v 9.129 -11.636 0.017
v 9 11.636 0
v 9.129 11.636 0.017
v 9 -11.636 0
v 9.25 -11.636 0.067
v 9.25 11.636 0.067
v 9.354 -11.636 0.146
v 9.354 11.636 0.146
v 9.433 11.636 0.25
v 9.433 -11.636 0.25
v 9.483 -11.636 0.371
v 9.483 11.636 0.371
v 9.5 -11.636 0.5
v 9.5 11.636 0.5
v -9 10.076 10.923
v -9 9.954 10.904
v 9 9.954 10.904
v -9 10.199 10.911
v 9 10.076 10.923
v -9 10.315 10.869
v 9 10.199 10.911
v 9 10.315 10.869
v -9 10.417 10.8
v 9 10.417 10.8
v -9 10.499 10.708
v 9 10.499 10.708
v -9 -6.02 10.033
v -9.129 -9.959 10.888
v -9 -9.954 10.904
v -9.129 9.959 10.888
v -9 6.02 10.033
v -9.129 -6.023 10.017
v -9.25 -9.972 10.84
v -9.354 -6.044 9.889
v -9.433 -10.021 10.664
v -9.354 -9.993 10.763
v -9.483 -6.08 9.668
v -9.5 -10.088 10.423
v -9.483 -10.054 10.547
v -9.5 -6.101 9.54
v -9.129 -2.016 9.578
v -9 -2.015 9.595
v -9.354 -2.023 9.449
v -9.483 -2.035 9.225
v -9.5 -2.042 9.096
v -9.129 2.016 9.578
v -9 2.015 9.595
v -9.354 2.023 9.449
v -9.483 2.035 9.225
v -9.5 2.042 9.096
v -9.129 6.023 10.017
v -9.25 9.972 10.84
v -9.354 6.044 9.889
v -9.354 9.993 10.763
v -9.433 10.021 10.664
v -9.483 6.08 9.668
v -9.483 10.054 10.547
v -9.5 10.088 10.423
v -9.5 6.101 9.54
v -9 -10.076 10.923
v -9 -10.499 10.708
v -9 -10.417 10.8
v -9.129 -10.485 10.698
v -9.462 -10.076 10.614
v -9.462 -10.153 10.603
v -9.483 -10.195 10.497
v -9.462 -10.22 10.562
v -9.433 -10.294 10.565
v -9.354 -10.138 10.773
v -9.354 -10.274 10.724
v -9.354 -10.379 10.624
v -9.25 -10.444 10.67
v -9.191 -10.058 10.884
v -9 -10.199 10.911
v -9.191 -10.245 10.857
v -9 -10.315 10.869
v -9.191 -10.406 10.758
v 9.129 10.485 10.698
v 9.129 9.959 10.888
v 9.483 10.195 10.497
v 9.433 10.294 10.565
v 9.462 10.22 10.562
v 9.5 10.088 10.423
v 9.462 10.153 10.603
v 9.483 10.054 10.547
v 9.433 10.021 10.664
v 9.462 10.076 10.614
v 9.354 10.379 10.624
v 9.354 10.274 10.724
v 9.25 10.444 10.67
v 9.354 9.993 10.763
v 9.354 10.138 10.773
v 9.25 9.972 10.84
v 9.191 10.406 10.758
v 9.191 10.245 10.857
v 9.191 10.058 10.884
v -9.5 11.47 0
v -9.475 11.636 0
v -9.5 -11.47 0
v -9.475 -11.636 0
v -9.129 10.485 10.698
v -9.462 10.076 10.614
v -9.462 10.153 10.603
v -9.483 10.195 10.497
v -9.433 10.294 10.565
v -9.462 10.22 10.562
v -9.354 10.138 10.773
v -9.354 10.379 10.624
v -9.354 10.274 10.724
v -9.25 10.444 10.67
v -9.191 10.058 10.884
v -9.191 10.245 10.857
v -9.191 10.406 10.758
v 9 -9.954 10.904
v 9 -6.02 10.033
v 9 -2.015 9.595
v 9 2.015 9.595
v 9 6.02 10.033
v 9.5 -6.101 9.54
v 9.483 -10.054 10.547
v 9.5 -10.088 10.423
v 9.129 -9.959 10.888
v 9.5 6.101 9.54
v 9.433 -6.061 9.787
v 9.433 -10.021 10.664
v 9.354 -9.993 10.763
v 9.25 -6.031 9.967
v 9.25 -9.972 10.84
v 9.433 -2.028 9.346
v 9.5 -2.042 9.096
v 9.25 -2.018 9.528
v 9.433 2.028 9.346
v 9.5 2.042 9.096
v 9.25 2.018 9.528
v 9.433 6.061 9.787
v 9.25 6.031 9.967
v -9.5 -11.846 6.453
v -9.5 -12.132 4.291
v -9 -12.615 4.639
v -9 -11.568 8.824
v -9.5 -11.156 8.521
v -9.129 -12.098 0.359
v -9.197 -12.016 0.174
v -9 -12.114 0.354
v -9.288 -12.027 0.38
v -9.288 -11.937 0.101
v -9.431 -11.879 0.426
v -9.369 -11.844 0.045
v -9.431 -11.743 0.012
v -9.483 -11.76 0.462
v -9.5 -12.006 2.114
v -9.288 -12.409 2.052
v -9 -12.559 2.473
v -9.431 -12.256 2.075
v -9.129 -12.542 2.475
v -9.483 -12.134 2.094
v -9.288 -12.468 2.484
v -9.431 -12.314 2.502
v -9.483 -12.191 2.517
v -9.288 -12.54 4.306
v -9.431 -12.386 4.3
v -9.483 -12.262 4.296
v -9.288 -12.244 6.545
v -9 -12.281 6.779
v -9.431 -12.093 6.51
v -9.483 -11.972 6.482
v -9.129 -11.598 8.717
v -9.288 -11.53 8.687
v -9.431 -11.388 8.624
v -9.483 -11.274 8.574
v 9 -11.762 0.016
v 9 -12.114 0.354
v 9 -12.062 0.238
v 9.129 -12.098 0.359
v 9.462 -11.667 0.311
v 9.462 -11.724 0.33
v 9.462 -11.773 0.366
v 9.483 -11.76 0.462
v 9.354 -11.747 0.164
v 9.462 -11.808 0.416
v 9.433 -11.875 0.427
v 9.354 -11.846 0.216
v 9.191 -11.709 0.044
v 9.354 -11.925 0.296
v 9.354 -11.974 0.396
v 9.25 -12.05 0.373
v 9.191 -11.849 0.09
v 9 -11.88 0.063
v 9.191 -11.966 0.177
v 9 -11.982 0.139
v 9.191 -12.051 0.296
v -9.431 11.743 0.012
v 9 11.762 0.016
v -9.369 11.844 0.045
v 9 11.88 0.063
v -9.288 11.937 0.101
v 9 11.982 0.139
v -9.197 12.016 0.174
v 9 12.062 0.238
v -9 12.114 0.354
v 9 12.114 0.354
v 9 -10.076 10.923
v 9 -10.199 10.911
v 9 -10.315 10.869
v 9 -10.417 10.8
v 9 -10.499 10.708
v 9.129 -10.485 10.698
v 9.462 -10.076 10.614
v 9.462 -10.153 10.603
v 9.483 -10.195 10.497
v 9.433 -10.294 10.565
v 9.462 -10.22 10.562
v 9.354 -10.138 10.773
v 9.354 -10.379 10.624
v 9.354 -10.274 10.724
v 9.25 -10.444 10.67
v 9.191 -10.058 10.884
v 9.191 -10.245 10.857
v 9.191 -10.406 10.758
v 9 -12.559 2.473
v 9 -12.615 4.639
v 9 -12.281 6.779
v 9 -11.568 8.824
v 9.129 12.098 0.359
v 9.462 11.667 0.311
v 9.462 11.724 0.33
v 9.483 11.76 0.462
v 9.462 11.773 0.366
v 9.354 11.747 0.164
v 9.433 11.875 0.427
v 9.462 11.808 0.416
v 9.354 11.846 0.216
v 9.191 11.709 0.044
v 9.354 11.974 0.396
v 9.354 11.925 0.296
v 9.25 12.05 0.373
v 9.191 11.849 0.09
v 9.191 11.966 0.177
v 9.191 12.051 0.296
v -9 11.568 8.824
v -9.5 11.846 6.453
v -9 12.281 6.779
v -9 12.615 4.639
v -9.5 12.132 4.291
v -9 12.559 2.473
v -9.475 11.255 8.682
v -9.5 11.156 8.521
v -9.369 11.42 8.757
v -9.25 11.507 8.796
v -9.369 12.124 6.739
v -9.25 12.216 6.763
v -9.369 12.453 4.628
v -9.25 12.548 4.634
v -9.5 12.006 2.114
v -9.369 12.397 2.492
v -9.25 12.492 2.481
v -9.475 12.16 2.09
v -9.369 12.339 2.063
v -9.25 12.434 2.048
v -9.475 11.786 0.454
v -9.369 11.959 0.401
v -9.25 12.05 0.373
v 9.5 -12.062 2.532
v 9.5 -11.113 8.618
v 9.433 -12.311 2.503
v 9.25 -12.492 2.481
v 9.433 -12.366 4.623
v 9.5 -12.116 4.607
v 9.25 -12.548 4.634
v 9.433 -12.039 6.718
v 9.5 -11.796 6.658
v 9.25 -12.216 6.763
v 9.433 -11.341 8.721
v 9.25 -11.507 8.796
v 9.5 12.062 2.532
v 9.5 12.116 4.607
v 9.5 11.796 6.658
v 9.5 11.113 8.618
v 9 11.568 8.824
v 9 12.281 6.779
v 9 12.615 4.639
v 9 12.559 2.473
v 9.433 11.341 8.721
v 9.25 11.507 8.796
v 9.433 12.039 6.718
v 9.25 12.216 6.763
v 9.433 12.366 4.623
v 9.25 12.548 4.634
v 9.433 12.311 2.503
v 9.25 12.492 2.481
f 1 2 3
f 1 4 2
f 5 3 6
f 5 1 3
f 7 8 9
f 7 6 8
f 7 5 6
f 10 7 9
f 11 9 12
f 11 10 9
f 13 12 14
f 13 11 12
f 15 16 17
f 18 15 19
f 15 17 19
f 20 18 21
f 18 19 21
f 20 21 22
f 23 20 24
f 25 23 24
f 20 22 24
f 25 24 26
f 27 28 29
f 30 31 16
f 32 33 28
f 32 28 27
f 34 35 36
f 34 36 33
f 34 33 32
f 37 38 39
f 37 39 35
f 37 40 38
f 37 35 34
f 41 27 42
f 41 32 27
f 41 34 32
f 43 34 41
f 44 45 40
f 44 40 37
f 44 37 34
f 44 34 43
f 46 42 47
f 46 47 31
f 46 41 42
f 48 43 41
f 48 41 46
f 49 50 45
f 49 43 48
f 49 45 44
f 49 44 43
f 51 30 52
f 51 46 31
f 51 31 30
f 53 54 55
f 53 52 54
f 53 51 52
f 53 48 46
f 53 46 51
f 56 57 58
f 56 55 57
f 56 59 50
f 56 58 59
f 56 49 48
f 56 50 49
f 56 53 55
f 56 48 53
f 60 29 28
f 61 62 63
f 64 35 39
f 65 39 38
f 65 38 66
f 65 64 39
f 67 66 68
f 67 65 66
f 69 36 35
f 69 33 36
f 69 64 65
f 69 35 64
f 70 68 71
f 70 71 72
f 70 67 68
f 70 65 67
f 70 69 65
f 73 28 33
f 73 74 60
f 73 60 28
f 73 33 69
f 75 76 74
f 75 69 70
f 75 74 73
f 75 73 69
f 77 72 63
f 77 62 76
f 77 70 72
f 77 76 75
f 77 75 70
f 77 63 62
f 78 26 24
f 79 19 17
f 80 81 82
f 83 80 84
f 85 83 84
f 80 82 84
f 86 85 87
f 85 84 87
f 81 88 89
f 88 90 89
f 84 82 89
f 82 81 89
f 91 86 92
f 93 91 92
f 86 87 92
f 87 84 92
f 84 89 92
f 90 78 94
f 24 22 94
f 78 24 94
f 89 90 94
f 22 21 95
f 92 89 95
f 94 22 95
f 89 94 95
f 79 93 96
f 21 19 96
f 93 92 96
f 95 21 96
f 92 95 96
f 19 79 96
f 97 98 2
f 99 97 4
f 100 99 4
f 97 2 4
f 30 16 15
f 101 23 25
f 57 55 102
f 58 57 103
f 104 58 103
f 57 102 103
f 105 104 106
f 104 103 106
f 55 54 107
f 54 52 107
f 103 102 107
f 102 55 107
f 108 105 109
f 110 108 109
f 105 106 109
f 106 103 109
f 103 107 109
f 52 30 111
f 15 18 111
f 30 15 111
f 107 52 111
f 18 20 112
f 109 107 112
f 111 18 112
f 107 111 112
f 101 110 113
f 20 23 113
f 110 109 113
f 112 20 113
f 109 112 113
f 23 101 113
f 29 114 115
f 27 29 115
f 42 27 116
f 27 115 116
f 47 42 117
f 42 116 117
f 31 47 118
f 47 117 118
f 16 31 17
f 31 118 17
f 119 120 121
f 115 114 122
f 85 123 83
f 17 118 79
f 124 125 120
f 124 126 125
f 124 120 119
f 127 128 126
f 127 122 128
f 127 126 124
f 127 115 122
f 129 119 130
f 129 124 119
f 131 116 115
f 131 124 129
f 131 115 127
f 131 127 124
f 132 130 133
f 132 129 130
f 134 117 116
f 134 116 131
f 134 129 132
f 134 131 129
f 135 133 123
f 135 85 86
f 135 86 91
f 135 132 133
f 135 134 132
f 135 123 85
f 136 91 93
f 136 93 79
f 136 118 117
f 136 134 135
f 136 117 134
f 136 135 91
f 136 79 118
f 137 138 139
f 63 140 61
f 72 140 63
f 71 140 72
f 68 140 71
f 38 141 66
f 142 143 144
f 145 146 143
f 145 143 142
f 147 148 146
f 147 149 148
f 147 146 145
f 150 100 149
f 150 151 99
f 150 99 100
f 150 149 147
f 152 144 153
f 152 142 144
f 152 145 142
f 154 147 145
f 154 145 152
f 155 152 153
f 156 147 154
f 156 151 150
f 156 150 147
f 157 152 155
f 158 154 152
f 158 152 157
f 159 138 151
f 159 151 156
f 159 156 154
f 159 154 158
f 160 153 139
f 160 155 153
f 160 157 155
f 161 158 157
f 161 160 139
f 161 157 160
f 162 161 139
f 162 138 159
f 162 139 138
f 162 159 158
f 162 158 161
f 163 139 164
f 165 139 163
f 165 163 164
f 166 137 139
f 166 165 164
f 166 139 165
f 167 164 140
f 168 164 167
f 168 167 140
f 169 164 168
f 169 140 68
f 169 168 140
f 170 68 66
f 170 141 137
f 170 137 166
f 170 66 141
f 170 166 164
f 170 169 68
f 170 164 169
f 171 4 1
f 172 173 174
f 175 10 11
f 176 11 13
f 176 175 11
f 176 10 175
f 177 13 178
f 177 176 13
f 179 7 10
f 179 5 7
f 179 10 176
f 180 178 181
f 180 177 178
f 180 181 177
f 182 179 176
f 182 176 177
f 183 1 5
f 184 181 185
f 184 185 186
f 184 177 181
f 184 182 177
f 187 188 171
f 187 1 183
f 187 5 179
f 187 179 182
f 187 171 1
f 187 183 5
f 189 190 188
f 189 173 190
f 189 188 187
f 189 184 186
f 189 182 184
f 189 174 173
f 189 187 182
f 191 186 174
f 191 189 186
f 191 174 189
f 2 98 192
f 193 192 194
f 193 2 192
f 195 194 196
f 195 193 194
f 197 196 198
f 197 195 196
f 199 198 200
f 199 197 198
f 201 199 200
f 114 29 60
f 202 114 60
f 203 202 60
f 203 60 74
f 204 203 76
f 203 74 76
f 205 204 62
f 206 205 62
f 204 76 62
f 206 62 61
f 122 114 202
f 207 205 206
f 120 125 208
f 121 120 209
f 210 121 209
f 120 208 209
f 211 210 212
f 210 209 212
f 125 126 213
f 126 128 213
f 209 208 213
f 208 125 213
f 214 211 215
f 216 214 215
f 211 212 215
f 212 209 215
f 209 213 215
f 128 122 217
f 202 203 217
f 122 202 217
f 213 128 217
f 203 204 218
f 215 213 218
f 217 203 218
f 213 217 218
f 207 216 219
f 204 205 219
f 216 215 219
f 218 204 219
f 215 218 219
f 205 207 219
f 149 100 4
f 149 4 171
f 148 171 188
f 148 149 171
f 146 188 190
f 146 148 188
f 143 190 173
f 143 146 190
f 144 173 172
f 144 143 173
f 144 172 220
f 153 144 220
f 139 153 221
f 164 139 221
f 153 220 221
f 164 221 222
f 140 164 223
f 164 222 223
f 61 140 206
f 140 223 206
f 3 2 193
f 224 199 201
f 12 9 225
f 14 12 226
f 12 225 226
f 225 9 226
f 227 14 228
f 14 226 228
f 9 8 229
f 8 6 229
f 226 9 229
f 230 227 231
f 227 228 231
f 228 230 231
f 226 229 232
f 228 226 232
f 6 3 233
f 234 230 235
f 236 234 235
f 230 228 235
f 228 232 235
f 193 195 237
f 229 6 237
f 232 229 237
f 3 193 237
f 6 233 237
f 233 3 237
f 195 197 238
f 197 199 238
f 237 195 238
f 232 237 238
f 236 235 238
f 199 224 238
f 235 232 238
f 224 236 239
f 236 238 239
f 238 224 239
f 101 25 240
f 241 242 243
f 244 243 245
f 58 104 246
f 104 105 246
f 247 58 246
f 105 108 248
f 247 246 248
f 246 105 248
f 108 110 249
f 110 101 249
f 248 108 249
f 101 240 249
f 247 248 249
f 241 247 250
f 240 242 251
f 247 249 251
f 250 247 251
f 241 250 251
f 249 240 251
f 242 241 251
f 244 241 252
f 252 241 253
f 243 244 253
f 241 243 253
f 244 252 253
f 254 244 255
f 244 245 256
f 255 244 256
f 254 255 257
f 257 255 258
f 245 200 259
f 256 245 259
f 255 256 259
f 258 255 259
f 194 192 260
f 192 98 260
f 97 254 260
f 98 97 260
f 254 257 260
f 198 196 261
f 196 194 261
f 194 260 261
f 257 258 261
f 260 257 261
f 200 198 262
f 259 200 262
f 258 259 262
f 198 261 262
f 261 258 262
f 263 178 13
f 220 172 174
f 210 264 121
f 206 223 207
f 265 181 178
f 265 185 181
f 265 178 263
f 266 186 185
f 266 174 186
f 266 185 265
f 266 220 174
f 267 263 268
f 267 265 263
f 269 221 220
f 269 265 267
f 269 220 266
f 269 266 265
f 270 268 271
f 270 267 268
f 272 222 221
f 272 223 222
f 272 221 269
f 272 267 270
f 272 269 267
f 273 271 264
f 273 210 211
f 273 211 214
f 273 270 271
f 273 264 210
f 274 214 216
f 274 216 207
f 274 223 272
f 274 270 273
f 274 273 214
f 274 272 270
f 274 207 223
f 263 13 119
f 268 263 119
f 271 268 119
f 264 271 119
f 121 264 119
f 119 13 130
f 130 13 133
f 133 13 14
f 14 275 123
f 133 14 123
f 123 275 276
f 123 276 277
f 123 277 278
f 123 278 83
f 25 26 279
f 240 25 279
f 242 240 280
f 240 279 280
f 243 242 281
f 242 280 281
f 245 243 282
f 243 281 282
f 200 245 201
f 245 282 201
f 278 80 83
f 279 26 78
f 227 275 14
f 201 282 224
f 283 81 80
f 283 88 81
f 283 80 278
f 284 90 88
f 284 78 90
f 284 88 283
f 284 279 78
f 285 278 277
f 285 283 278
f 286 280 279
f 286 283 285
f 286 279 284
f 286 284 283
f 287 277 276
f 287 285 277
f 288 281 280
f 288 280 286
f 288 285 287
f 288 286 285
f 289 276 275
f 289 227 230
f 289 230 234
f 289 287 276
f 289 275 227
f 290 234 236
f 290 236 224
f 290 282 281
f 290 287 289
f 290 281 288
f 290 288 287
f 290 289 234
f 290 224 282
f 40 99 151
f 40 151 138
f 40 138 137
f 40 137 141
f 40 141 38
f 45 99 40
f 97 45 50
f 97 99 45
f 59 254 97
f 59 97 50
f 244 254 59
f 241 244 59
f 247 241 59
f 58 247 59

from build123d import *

# Parameters (mm, degrees)
BOSS_EXTRUDE2_DEPTH = 9.5
FILLET1_R           = 0.5


with BuildPart() as part:
    # Sketch2 → Boss-Extrude2 (new body, symmetric)
    with BuildSketch(Plane(origin=(0, 0, 0), x_dir=(0, 0, -1), z_dir=(1, 0, 0))):
        with BuildLine():
            Line((0, 12), (0, -12))
            ThreePointArc((0, -12), (-5.710285596, -12.497714363), (-11, -10.29))
            ThreePointArc((-11, -10.29), (-9.540341867, 0), (-11, 10.29))
            ThreePointArc((-11, 10.29), (-5.710285596, 12.497714363), (0, 12))
        make_face()
    extrude(amount=BOSS_EXTRUDE2_DEPTH, both=True)

    # Fillet1
    fillet1_edges = [part.edges().sort_by_distance(p)[0] for p in [
        (9.5, 12.497714363, 5.710285596),
        (9.5, 0, 9.540341867),
        (9.5, -12.497714363, 5.710285596),
        (-9.5, 0, 9.540341867),
        (-9.5, 12.497714363, 5.710285596),
        (-9.5, -12.497714363, 5.710285596),
        (0, -10.29, 11),
        (0, 10.29, 11),
        (0, 12, 0),
        (0, -12, 0),
        (9.5, 0, 0),
    ]]
    fillet(fillet1_edges, radius=FILLET1_R)


solid = part.part
